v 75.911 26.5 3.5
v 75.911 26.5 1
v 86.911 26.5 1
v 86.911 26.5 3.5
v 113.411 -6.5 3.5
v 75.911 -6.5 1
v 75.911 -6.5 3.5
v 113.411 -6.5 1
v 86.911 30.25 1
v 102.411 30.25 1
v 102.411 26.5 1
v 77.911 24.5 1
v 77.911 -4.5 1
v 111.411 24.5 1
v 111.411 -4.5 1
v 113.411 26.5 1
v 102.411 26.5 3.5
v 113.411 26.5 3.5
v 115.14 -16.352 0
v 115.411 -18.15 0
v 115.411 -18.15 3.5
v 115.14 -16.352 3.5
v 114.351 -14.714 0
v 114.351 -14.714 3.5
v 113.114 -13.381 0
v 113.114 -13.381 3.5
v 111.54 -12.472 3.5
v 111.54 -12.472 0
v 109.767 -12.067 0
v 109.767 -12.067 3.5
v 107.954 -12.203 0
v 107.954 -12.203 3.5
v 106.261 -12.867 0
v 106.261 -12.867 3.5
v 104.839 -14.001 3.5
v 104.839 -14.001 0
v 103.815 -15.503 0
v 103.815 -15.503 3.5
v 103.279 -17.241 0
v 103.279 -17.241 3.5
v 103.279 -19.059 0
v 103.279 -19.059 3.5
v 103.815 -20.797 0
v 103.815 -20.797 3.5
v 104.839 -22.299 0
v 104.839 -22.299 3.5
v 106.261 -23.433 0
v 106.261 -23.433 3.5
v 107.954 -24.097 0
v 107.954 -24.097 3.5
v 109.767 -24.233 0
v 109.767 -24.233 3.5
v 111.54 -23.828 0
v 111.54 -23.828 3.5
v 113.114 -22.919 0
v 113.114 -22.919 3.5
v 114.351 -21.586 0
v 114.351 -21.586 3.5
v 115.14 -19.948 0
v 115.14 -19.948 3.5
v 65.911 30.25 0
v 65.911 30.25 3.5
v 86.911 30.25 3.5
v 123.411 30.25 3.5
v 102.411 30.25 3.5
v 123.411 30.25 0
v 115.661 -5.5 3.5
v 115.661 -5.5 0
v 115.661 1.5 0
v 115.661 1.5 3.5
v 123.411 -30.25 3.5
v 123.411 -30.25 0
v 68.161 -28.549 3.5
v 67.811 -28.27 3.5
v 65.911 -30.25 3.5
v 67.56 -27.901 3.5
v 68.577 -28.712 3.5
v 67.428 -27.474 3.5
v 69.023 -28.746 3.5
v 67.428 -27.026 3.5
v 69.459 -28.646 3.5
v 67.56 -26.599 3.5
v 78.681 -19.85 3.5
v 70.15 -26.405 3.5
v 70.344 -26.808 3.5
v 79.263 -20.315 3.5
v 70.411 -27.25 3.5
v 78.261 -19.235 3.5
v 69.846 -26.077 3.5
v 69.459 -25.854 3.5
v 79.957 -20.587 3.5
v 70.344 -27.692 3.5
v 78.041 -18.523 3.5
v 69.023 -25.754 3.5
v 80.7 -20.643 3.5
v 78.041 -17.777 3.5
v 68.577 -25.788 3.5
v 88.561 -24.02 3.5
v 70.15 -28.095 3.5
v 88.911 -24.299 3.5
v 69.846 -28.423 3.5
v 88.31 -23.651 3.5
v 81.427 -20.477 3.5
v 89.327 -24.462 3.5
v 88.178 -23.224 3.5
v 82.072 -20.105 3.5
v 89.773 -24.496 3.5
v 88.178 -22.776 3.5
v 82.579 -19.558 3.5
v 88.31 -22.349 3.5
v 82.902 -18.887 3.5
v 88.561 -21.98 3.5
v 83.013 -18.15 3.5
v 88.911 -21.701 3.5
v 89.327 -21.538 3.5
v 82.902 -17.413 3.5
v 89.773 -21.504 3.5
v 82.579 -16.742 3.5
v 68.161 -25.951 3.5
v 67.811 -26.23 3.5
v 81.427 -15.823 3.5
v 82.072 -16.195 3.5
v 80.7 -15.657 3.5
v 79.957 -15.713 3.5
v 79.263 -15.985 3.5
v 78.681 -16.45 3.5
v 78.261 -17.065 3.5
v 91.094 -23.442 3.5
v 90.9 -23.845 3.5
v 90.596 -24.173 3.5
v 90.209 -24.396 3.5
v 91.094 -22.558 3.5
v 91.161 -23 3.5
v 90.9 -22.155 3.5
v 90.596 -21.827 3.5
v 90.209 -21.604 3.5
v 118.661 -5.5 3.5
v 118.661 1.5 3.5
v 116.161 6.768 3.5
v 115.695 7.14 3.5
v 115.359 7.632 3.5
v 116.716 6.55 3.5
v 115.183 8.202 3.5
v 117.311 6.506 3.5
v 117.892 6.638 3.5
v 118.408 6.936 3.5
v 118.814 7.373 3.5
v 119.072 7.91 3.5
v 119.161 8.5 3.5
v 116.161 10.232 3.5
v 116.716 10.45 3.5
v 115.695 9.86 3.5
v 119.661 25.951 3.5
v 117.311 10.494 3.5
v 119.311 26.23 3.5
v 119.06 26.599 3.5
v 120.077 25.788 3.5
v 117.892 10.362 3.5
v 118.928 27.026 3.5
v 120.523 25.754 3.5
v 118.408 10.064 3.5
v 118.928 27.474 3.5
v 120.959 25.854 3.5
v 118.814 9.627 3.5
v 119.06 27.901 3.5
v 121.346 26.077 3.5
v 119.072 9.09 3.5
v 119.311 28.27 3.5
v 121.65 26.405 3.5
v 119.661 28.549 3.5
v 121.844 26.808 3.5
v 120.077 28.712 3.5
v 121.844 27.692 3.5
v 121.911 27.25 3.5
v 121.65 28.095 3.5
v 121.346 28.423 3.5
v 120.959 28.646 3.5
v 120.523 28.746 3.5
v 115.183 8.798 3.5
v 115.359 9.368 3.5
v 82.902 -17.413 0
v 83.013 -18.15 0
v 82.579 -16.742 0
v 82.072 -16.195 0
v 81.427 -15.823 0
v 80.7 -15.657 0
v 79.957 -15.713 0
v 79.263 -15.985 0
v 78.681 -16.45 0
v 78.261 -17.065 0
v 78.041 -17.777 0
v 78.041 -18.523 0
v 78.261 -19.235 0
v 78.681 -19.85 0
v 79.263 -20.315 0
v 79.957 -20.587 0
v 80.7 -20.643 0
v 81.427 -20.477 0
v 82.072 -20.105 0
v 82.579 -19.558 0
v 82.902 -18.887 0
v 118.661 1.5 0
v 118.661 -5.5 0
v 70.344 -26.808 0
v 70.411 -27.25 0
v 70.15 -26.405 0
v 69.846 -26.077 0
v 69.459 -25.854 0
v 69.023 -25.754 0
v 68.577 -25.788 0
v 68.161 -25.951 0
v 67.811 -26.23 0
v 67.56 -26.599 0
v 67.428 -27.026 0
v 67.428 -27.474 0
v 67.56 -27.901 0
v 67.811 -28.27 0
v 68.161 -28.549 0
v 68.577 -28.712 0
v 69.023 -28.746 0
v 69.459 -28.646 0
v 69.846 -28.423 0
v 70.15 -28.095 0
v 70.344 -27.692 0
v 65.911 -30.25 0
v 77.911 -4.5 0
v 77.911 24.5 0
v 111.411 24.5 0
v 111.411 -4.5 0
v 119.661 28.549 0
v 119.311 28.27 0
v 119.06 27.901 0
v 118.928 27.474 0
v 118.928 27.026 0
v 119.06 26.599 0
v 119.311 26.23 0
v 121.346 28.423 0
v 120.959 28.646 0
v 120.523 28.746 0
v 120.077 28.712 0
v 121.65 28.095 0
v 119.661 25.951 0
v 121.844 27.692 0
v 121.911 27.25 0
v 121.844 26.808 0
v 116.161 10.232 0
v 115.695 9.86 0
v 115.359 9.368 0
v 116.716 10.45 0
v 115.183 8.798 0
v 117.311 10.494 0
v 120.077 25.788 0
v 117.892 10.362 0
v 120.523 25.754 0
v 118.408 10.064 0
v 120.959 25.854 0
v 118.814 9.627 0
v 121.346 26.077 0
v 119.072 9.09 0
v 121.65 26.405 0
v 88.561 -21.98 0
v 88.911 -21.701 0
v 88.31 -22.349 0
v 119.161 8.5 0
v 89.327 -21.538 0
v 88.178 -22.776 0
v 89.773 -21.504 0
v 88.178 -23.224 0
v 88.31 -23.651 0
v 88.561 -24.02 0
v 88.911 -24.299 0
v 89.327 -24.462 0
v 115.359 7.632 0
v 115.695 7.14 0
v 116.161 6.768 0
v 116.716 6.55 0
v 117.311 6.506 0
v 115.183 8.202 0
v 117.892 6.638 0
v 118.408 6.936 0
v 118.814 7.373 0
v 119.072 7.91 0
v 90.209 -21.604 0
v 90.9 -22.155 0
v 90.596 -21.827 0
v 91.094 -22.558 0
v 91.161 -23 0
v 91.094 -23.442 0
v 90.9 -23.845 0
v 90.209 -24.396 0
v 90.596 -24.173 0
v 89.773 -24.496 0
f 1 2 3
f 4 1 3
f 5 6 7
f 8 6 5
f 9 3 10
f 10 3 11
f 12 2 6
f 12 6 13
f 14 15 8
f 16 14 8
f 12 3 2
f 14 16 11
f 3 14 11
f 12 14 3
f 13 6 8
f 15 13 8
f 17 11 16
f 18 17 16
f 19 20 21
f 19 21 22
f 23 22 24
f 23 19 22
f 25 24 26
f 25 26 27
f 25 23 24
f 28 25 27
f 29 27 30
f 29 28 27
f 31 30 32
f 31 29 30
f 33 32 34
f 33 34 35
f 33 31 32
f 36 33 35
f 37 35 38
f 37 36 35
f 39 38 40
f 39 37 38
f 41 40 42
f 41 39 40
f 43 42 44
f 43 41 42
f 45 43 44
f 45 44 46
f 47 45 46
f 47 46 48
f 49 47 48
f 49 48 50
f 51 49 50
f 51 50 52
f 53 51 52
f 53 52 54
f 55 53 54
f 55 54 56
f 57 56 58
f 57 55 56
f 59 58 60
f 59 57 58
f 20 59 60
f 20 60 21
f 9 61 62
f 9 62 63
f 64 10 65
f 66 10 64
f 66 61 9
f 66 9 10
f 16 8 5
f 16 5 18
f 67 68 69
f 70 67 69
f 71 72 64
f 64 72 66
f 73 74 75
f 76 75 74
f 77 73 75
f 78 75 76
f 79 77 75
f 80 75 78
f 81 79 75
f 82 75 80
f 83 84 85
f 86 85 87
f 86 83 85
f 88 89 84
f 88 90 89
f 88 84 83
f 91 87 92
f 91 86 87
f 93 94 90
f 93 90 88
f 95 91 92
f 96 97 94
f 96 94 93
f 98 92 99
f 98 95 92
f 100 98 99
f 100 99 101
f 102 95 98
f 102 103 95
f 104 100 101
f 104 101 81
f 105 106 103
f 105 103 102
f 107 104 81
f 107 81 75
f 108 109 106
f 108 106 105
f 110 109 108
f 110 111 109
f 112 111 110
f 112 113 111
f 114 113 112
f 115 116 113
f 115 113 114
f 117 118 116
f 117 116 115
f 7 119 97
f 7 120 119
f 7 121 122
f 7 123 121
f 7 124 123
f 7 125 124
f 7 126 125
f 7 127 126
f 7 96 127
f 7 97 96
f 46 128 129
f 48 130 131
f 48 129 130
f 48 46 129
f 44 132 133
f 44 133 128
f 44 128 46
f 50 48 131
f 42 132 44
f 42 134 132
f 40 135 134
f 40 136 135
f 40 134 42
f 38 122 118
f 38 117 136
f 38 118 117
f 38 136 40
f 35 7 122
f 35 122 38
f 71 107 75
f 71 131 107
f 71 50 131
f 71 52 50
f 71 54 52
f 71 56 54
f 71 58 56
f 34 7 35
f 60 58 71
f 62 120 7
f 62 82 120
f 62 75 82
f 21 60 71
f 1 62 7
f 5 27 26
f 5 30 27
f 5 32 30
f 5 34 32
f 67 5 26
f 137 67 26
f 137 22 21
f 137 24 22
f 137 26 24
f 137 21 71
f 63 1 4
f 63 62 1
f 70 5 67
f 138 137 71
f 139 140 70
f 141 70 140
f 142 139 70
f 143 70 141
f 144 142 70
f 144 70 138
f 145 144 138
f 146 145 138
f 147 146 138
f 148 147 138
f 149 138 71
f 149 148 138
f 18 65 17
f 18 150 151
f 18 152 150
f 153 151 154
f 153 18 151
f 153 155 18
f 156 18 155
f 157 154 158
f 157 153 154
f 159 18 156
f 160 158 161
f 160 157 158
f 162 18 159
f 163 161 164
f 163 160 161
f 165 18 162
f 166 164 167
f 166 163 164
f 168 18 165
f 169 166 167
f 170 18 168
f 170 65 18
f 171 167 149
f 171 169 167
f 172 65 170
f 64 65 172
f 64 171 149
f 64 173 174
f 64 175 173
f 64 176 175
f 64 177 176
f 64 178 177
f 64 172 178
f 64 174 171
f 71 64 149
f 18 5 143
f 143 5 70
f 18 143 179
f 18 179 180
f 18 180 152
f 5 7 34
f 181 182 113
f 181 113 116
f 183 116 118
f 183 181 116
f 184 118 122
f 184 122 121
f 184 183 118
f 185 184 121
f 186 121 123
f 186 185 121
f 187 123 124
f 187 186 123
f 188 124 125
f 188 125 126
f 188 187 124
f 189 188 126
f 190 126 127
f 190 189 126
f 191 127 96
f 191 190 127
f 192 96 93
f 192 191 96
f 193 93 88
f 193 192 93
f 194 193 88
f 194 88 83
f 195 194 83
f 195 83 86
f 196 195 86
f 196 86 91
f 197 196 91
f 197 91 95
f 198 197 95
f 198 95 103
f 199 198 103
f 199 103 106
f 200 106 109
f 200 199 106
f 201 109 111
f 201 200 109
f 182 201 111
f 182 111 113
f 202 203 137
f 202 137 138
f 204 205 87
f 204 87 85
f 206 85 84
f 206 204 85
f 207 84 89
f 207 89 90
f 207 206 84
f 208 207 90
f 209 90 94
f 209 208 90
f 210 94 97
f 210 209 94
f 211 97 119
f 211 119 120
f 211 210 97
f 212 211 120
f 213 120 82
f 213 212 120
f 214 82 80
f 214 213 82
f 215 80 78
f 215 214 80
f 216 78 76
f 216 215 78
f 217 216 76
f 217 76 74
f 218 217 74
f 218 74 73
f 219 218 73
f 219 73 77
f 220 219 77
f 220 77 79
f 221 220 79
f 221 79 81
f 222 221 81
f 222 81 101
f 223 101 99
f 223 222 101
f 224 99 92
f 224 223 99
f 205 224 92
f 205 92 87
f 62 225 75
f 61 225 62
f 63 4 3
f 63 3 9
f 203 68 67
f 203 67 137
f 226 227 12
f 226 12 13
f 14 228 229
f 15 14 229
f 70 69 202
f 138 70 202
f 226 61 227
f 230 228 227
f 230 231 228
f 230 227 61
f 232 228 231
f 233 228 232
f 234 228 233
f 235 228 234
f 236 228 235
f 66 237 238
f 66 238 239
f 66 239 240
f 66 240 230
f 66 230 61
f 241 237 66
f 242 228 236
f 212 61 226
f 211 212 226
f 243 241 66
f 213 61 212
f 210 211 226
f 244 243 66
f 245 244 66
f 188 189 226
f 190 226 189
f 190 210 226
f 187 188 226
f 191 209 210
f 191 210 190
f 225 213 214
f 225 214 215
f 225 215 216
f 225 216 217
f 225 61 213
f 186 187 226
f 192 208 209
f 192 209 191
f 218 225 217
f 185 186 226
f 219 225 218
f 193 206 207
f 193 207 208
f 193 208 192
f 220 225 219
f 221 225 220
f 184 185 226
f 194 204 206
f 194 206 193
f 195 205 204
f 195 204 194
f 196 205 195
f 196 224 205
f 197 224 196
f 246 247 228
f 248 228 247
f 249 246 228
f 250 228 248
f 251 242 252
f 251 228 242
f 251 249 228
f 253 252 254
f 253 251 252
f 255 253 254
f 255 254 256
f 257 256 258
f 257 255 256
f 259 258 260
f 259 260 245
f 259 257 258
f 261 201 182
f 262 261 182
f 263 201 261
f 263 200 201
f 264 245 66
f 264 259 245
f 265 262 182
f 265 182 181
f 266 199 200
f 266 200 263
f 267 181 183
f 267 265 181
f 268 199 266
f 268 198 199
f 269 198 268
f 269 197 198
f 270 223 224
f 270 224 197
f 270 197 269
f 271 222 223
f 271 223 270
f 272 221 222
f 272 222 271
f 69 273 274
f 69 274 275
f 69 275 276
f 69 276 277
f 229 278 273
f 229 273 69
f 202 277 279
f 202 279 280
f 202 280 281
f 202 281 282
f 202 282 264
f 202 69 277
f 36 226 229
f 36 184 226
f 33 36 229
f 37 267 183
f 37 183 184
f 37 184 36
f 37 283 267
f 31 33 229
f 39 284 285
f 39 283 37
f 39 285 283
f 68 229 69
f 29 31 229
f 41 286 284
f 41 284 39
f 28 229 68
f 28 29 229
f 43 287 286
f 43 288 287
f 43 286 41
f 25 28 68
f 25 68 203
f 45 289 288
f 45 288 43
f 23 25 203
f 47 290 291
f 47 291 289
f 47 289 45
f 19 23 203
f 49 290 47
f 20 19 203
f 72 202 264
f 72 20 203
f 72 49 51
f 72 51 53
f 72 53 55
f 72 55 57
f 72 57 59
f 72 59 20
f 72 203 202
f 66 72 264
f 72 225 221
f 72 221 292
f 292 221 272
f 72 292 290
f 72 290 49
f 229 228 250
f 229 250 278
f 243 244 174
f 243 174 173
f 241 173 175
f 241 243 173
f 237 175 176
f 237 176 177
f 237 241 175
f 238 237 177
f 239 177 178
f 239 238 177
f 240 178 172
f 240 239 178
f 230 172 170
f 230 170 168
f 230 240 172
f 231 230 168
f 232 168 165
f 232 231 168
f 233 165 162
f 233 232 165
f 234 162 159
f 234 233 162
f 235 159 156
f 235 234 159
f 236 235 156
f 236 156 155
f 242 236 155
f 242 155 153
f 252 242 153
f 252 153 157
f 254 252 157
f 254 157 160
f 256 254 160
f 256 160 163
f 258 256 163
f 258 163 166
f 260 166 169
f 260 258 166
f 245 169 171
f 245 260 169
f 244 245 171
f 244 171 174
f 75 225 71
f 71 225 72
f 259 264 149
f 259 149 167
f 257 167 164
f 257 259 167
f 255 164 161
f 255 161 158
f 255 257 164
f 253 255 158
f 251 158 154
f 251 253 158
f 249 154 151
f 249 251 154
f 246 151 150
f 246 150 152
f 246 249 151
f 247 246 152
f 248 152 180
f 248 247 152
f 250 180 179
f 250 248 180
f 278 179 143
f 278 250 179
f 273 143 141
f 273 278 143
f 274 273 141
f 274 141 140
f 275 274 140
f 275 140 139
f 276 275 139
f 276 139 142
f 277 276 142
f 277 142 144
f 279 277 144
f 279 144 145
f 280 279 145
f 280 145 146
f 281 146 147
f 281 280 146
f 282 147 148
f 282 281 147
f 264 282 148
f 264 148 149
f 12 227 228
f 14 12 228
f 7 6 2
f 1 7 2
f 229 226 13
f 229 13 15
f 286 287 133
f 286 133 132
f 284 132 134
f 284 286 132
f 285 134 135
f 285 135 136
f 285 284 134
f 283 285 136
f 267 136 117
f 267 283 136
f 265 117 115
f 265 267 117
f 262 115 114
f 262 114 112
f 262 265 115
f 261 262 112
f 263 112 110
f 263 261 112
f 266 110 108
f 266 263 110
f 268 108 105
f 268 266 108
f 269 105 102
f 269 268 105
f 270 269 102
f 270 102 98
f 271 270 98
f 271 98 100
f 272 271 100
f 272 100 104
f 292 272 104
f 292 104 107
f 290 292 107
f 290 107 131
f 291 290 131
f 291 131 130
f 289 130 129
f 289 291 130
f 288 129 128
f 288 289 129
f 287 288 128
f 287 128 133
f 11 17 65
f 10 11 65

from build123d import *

# Parameters (mm, degrees)
F0_W     = 57.5
F0_H     = 60.5
F0_R     = 1.5
F0_R_2   = 2.5
F0_R_3   = 6.1
F0_W_2   = 3
F0_H_2   = 7
F0_W_3   = 37.5
F0_H_3   = 33
F0_R_4   = 2
F1_DEPTH = 3.5
F3_W     = 37.5
F3_H     = 33
F3_W_2   = 33.5
F3_H_2   = 29
F4_DEPTH = 1
F2_W     = 15.5
F2_H     = 3.75
F5_DEPTH = 2.5


with BuildPart() as f1:
    # F0 (on Top) → F1 (new body)
    with BuildSketch(Plane.XY):
        with Locations((94.6610440163, 0)):
            Rectangle(F0_W, F0_H)
        with Locations((68.9110440163, -27.25)):
            Circle(F0_R, mode=Mode.SUBTRACT)
        with Locations((89.6610440163, -23)):
            Circle(F0_R, mode=Mode.SUBTRACT)
        with Locations((80.5132240057, -18.15)):
            Circle(F0_R_2, mode=Mode.SUBTRACT)
        with Locations((109.3110440163, -18.15)):
            Circle(F0_R_3, mode=Mode.SUBTRACT)
        with Locations((117.1610440163, -2)):
            Rectangle(F0_W_2, F0_H_2, mode=Mode.SUBTRACT)
        with Locations((94.6610440163, 10)):
            Rectangle(F0_W_3, F0_H_3, mode=Mode.SUBTRACT)
        with Locations((117.1610440163, 8.5)):
            Circle(F0_R_4, mode=Mode.SUBTRACT)
        with Locations((120.4110440163, 27.25)):
            Circle(F0_R, mode=Mode.SUBTRACT)
    extrude(amount=F1_DEPTH)

    # F3 (on face) → F4 (join)
    with BuildSketch(Plane(origin=(0, 0, 0), x_dir=(1, 0, 0), z_dir=(0, 0, -1))):
        with Locations((94.6610440163, -10)):
            Rectangle(F3_W, F3_H)
        with Locations((94.6610440163, -10)):
            Rectangle(F3_W_2, F3_H_2, mode=Mode.SUBTRACT)
    extrude(amount=-F4_DEPTH)

    # F2 (on face) → F5 (cut)
    with BuildSketch(Plane.XY.offset(3.5)):
        with Locations((94.6610440163, 28.375)):
            Rectangle(F2_W, F2_H)
    extrude(amount=-F5_DEPTH, mode=Mode.SUBTRACT)


solid = f1.part
